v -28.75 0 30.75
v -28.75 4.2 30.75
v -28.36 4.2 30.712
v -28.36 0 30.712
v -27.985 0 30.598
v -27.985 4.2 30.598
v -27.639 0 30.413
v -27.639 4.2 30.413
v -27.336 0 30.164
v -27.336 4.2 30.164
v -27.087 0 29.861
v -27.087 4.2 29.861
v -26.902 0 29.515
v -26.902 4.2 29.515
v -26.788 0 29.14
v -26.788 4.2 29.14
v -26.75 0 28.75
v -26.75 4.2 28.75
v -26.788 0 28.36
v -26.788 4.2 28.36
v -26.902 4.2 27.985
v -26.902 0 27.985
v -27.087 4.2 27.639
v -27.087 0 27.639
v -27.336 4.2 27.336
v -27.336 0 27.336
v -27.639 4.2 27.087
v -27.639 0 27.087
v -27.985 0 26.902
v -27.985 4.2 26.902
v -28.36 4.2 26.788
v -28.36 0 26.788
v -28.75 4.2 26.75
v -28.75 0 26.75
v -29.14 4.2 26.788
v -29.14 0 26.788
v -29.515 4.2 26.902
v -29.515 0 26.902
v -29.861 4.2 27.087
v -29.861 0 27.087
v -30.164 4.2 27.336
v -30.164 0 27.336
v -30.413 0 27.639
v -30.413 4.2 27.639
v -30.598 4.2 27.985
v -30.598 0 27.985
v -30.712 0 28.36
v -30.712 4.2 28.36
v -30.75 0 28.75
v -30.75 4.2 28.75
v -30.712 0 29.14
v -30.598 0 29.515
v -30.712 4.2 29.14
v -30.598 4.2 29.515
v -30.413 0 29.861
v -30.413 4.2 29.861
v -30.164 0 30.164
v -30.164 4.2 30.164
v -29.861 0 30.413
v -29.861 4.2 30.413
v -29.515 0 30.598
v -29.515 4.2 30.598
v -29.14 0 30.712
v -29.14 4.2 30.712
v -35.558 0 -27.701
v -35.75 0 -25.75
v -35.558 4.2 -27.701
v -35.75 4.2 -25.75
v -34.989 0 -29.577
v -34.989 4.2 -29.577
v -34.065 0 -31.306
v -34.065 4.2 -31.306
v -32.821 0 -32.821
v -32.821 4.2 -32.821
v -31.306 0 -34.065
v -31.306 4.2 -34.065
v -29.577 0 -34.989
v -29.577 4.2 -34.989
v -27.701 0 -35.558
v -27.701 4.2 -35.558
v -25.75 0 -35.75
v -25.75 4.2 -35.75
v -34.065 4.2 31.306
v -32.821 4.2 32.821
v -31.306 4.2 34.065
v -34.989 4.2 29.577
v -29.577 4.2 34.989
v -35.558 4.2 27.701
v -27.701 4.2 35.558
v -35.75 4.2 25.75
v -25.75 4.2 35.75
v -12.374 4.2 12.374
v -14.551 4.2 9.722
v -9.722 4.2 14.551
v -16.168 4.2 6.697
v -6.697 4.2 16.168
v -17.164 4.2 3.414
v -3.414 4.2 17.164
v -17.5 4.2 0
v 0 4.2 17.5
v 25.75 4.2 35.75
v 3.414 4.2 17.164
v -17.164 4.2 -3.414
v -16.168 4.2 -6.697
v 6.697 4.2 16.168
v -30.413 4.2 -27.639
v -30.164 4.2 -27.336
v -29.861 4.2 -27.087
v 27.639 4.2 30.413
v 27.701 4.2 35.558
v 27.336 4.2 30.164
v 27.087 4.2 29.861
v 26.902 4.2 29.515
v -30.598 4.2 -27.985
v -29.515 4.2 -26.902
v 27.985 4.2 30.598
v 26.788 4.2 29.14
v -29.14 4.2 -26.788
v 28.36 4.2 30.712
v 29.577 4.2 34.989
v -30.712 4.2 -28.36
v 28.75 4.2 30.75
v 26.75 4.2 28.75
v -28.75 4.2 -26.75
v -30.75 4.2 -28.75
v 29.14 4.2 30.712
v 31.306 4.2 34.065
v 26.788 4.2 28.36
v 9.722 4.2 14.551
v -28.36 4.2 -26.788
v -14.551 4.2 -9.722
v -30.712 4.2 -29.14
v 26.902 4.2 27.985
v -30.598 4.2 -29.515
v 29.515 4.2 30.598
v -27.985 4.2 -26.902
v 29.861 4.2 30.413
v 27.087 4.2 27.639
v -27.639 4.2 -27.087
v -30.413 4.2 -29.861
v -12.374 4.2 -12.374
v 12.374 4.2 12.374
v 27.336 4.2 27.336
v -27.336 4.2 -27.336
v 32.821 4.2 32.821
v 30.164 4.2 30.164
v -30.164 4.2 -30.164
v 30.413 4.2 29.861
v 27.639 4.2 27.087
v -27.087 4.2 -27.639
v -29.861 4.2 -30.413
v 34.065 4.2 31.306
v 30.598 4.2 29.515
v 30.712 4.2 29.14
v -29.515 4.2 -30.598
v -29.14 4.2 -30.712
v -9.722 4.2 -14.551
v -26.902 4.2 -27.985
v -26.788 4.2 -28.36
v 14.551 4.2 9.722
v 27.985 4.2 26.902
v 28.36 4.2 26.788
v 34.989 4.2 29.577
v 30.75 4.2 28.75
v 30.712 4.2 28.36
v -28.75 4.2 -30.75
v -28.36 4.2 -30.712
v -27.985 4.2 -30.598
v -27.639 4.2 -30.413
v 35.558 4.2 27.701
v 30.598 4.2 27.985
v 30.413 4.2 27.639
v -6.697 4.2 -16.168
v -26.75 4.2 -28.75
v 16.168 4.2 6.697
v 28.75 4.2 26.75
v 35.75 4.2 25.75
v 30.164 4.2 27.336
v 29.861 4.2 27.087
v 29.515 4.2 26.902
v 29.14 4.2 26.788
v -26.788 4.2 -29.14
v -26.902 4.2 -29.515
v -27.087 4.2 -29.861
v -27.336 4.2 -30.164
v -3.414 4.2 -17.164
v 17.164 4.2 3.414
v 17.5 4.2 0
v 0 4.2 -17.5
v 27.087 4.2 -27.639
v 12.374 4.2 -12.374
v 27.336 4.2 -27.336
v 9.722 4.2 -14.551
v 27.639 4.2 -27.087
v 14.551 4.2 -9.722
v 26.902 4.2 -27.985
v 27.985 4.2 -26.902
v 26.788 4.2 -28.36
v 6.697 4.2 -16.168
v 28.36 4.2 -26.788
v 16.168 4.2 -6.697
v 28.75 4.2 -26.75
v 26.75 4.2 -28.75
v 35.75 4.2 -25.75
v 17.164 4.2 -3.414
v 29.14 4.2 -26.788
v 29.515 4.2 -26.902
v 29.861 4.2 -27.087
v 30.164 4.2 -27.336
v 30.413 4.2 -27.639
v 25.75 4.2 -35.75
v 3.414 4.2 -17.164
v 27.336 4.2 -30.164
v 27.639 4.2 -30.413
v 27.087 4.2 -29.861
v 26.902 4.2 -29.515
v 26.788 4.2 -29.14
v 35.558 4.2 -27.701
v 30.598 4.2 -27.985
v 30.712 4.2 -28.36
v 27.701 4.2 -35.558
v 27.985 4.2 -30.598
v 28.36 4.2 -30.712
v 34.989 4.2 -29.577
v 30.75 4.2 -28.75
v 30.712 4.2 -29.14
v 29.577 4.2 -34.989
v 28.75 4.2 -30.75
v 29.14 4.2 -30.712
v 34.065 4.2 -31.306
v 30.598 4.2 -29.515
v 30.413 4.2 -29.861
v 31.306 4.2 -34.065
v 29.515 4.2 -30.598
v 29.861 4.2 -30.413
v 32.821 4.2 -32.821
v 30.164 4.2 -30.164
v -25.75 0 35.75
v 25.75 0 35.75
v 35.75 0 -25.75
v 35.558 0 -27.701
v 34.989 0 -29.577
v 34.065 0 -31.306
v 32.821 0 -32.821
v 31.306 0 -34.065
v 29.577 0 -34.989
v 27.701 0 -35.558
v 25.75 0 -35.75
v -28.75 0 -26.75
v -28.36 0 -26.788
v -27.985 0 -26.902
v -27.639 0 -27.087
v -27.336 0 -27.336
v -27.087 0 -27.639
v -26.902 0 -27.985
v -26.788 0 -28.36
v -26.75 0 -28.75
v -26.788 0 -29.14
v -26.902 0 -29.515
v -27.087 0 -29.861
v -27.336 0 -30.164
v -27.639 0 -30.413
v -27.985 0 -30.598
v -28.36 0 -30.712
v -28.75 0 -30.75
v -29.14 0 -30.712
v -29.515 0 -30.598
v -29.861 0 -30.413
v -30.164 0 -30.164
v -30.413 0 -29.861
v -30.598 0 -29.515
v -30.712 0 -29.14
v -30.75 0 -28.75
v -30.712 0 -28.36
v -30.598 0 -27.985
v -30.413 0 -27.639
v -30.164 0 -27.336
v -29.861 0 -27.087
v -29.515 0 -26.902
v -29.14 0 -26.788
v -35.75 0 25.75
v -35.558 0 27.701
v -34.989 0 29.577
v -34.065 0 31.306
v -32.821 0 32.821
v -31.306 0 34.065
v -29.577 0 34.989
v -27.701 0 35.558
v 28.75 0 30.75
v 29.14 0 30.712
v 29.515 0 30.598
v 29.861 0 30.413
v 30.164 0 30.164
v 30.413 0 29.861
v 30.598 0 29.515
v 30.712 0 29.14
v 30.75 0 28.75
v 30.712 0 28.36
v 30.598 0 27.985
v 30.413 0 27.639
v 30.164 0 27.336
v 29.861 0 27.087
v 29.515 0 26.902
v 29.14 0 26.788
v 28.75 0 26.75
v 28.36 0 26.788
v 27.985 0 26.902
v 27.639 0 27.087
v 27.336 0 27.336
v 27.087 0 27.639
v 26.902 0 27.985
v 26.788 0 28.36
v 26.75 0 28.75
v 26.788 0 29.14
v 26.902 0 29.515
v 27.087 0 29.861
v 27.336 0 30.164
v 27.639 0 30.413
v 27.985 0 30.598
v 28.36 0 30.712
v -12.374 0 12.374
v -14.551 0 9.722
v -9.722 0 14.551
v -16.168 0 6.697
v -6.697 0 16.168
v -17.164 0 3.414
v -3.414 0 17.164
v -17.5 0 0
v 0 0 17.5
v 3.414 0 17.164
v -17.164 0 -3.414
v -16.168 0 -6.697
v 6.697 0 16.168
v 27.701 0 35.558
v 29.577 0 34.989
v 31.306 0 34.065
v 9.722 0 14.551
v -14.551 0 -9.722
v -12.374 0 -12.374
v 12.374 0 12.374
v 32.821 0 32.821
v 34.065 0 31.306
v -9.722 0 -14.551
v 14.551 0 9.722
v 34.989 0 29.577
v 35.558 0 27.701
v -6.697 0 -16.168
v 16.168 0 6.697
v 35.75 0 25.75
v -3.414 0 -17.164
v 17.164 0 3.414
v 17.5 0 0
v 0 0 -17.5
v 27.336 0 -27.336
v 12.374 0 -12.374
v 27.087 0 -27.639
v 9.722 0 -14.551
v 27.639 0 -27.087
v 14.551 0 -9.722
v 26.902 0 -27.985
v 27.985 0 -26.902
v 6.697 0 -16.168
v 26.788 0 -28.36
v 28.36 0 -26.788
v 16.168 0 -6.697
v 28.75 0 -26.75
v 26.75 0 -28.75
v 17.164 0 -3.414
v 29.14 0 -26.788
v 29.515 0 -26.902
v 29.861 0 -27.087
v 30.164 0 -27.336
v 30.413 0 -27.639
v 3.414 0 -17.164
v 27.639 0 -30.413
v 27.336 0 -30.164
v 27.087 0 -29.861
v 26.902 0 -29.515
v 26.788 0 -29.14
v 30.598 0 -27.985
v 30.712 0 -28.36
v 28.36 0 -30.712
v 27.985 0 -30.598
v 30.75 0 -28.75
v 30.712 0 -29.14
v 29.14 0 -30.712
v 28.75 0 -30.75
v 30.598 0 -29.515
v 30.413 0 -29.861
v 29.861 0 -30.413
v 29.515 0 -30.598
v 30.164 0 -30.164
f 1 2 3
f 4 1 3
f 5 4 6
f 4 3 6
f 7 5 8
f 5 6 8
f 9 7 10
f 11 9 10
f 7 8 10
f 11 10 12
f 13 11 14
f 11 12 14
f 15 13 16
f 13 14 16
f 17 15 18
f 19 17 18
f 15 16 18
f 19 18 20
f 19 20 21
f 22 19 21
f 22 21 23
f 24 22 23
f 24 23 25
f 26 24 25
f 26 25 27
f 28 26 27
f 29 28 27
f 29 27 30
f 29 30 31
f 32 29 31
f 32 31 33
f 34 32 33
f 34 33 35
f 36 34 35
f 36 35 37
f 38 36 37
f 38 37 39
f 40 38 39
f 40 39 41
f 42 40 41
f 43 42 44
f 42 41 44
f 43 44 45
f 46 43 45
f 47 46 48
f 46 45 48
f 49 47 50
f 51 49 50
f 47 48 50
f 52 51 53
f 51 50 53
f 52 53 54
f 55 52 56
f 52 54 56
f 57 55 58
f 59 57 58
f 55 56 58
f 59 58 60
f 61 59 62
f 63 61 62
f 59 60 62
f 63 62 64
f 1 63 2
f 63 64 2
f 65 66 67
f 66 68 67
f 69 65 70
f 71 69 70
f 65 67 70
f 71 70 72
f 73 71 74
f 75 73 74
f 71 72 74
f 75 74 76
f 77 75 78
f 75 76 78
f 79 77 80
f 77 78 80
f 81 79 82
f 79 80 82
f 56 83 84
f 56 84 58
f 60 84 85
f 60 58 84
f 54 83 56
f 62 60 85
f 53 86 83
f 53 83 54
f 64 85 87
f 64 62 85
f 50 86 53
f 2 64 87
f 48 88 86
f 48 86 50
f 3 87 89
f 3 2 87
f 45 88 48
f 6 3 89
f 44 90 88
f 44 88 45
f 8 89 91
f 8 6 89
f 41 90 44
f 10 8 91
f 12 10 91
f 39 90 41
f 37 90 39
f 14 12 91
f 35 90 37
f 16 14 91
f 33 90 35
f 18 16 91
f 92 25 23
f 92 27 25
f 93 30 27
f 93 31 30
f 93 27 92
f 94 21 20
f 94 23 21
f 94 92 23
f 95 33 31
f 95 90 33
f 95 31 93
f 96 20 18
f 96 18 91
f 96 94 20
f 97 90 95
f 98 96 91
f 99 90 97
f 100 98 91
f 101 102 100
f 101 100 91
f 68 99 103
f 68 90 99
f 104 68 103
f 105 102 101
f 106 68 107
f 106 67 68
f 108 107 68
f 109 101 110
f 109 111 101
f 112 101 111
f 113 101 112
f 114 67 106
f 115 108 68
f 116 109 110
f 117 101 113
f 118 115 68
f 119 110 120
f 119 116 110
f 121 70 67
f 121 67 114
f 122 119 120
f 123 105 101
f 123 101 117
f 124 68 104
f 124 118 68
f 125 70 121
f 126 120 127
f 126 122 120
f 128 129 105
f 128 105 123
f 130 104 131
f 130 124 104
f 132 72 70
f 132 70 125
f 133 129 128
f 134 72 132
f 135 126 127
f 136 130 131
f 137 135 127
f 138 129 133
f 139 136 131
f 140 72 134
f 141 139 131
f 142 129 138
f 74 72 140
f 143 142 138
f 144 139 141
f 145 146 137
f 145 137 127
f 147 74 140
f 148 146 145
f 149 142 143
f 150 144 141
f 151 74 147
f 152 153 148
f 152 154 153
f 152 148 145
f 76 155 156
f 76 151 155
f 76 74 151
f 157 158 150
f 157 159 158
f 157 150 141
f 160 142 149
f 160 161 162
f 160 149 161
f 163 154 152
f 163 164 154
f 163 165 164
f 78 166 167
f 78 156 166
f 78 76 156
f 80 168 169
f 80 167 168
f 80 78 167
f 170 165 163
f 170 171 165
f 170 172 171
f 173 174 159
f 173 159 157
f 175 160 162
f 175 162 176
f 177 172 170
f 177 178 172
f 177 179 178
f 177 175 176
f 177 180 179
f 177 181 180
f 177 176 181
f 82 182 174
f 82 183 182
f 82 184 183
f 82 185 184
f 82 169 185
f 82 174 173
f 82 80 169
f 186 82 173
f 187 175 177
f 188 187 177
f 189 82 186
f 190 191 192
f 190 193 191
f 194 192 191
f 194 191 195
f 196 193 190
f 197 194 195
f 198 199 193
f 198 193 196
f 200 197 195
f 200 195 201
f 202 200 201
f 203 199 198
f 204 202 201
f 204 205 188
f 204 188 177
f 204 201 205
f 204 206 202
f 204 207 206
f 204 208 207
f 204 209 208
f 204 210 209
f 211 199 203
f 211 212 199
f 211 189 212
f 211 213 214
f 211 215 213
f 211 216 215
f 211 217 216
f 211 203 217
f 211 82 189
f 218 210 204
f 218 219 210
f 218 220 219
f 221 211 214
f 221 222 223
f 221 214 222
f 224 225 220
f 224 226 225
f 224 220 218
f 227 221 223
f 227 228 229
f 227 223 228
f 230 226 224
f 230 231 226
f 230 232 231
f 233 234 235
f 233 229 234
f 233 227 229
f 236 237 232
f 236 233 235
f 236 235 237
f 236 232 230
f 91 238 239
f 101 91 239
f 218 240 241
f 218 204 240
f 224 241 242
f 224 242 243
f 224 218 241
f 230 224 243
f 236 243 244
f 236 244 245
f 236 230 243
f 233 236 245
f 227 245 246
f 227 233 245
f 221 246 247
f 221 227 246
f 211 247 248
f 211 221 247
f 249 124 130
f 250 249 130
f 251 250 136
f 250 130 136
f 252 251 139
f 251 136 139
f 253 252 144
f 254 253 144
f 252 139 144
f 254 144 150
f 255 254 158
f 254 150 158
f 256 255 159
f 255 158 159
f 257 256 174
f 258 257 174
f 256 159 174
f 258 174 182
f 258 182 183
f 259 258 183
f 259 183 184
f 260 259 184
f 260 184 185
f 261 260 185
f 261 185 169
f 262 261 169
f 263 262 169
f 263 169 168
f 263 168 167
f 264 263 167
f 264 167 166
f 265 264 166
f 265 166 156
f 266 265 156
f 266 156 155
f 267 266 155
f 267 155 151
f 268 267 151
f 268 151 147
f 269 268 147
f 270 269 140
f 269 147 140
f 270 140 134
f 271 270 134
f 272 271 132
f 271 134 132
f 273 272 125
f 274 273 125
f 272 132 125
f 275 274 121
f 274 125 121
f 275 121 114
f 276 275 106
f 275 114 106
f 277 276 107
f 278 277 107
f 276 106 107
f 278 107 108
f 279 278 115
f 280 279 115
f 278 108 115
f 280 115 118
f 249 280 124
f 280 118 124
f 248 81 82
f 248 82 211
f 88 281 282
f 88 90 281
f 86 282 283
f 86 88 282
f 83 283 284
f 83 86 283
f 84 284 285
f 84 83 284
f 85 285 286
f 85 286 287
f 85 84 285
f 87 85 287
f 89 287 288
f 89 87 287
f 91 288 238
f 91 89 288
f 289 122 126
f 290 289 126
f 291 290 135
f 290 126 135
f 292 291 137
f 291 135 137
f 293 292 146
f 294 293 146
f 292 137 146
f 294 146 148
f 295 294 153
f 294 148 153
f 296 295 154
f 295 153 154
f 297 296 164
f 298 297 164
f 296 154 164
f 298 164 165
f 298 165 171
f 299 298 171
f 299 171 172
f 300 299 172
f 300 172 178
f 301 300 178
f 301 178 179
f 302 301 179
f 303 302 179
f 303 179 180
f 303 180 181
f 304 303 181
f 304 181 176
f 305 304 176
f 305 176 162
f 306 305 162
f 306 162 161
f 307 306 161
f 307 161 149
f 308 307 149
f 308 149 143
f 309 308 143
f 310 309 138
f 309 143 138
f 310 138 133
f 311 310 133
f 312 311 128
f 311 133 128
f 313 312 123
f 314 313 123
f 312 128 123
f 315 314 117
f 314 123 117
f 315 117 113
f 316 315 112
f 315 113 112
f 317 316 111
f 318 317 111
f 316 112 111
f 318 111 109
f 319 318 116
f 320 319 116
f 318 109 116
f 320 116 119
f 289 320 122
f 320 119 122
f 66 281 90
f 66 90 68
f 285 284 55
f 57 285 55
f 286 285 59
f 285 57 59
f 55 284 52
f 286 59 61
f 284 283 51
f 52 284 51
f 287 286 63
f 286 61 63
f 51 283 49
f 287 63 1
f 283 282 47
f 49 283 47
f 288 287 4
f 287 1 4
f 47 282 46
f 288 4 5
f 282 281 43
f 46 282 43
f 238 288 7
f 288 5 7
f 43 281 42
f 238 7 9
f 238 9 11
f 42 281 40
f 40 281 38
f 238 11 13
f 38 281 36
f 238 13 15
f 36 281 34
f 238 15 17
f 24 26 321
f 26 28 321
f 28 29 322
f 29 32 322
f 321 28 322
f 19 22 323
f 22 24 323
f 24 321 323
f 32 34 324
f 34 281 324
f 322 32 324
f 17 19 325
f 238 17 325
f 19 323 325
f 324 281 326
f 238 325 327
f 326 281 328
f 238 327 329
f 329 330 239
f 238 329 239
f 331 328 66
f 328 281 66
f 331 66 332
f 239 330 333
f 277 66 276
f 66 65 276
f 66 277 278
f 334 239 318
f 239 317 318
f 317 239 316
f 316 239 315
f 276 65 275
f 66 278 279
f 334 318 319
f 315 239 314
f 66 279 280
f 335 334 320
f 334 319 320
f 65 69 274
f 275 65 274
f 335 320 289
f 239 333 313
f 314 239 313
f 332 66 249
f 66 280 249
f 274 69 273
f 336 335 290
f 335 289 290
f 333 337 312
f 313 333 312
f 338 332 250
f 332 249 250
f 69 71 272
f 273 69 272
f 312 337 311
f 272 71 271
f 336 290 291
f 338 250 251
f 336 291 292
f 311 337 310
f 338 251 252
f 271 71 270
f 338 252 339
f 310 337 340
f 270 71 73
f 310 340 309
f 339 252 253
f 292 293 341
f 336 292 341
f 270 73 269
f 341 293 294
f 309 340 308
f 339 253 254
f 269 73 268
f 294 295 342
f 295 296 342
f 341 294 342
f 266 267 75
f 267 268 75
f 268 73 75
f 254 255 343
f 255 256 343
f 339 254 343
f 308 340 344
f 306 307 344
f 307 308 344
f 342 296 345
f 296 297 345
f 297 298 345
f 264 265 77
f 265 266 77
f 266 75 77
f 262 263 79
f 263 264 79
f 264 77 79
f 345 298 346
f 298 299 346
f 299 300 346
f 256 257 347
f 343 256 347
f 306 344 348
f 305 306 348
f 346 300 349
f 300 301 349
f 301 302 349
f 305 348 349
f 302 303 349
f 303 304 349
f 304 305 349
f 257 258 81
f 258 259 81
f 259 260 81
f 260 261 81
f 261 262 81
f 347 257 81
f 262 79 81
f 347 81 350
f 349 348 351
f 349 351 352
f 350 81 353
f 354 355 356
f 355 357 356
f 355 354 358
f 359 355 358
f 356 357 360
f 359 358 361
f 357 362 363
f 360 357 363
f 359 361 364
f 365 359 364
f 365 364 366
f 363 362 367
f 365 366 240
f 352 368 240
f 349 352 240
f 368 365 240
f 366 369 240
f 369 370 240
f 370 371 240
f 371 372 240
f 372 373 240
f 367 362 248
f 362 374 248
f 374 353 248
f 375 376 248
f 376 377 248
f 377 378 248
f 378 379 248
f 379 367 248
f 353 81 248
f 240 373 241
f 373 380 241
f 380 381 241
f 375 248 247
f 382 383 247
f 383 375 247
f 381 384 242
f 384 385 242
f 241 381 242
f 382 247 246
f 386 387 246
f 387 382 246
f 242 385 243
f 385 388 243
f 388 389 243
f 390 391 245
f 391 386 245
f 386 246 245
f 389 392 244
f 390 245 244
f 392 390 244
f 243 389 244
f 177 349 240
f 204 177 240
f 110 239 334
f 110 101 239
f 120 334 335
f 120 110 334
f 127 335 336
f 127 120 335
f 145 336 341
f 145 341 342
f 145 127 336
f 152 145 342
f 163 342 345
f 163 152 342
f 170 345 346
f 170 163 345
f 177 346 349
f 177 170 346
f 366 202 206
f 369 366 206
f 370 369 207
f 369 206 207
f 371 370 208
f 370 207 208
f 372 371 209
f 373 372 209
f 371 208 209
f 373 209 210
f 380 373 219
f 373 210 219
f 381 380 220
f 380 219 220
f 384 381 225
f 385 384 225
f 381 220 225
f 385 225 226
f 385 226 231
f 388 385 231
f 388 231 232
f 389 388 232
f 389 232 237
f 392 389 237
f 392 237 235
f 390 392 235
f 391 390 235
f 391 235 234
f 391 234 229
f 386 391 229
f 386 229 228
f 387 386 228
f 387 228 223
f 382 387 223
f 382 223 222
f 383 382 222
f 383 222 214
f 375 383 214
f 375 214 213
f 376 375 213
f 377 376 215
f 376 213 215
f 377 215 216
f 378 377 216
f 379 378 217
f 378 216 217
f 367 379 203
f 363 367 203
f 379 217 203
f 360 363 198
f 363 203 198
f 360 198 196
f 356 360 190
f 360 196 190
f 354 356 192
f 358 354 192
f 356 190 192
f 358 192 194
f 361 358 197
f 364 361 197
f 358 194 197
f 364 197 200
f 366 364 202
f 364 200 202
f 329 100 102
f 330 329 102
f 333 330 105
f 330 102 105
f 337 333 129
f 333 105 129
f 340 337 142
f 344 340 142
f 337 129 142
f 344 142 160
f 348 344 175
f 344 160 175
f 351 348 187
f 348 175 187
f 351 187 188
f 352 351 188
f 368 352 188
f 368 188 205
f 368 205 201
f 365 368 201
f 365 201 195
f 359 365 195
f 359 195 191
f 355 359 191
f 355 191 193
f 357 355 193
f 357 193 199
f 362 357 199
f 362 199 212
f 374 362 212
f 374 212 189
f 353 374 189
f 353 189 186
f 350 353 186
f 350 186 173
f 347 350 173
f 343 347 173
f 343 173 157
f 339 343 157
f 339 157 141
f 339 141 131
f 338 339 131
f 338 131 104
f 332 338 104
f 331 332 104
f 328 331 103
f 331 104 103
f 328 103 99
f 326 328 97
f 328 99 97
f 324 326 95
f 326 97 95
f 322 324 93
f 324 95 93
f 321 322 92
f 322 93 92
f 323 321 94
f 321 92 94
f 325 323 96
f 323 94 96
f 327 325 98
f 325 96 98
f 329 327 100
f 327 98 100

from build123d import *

# Parameters (mm, degrees)
SKETCH1_W           = 71.5
SKETCH1_H           = 71.5
BOSS_EXTRUDE1_DEPTH = 4.2
FILLET1_R           = 10
SKETCH2_R           = 17.5
CUT_EXTRUDE1_DEPTH  = 51.732287549
SKETCH3_R           = 2
CUT_EXTRUDE2_DEPTH  = 51.732287549


with BuildPart() as part:
    # Sketch1 → Boss-Extrude1 (new body)
    with BuildSketch(Plane(origin=(0, 0, 0), x_dir=(1, 0, 0), z_dir=(0, 1, 0))):
        Rectangle(SKETCH1_W, SKETCH1_H)
    extrude(amount=BOSS_EXTRUDE1_DEPTH)

    # Fillet1
    fillet1_edges = [part.edges().sort_by_distance(p)[0] for p in [
        (35.75, 2.1, 35.75),
        (-35.75, 2.1, 35.75),
        (-35.75, 2.1, -35.75),
        (35.75, 2.1, -35.75),
    ]]
    fillet(fillet1_edges, radius=FILLET1_R)

    # Sketch2 → Cut-Extrude1 (cut, through all)
    with BuildSketch(Plane(origin=(0, 4.2, 0), x_dir=(1, 0, 0), z_dir=(0, 1, 0))):
        with Locations(Location((0, 0, 0), (0, 0, 270))):
            Circle(SKETCH2_R)
    extrude(amount=-CUT_EXTRUDE1_DEPTH, mode=Mode.SUBTRACT)

    # Sketch3 → Cut-Extrude2 (cut, through all)
    with BuildSketch(Plane(origin=(0, 4.2, 0), x_dir=(1, 0, 0), z_dir=(0, 1, 0))):
        with Locations(Location((-28.75, 28.75, 0), (0, 0, 270))):
            Circle(SKETCH3_R)
        with Locations(Location((28.75, 28.75, 0), (0, 0, 270))):
            Circle(SKETCH3_R)
        with Locations(Location((-28.75, -28.75, 0), (0, 0, 270))):
            Circle(SKETCH3_R)
        with Locations(Location((28.75, -28.75, 0), (0, 0, 270))):
            Circle(SKETCH3_R)
    extrude(amount=-CUT_EXTRUDE2_DEPTH, mode=Mode.SUBTRACT)


solid = part.part
